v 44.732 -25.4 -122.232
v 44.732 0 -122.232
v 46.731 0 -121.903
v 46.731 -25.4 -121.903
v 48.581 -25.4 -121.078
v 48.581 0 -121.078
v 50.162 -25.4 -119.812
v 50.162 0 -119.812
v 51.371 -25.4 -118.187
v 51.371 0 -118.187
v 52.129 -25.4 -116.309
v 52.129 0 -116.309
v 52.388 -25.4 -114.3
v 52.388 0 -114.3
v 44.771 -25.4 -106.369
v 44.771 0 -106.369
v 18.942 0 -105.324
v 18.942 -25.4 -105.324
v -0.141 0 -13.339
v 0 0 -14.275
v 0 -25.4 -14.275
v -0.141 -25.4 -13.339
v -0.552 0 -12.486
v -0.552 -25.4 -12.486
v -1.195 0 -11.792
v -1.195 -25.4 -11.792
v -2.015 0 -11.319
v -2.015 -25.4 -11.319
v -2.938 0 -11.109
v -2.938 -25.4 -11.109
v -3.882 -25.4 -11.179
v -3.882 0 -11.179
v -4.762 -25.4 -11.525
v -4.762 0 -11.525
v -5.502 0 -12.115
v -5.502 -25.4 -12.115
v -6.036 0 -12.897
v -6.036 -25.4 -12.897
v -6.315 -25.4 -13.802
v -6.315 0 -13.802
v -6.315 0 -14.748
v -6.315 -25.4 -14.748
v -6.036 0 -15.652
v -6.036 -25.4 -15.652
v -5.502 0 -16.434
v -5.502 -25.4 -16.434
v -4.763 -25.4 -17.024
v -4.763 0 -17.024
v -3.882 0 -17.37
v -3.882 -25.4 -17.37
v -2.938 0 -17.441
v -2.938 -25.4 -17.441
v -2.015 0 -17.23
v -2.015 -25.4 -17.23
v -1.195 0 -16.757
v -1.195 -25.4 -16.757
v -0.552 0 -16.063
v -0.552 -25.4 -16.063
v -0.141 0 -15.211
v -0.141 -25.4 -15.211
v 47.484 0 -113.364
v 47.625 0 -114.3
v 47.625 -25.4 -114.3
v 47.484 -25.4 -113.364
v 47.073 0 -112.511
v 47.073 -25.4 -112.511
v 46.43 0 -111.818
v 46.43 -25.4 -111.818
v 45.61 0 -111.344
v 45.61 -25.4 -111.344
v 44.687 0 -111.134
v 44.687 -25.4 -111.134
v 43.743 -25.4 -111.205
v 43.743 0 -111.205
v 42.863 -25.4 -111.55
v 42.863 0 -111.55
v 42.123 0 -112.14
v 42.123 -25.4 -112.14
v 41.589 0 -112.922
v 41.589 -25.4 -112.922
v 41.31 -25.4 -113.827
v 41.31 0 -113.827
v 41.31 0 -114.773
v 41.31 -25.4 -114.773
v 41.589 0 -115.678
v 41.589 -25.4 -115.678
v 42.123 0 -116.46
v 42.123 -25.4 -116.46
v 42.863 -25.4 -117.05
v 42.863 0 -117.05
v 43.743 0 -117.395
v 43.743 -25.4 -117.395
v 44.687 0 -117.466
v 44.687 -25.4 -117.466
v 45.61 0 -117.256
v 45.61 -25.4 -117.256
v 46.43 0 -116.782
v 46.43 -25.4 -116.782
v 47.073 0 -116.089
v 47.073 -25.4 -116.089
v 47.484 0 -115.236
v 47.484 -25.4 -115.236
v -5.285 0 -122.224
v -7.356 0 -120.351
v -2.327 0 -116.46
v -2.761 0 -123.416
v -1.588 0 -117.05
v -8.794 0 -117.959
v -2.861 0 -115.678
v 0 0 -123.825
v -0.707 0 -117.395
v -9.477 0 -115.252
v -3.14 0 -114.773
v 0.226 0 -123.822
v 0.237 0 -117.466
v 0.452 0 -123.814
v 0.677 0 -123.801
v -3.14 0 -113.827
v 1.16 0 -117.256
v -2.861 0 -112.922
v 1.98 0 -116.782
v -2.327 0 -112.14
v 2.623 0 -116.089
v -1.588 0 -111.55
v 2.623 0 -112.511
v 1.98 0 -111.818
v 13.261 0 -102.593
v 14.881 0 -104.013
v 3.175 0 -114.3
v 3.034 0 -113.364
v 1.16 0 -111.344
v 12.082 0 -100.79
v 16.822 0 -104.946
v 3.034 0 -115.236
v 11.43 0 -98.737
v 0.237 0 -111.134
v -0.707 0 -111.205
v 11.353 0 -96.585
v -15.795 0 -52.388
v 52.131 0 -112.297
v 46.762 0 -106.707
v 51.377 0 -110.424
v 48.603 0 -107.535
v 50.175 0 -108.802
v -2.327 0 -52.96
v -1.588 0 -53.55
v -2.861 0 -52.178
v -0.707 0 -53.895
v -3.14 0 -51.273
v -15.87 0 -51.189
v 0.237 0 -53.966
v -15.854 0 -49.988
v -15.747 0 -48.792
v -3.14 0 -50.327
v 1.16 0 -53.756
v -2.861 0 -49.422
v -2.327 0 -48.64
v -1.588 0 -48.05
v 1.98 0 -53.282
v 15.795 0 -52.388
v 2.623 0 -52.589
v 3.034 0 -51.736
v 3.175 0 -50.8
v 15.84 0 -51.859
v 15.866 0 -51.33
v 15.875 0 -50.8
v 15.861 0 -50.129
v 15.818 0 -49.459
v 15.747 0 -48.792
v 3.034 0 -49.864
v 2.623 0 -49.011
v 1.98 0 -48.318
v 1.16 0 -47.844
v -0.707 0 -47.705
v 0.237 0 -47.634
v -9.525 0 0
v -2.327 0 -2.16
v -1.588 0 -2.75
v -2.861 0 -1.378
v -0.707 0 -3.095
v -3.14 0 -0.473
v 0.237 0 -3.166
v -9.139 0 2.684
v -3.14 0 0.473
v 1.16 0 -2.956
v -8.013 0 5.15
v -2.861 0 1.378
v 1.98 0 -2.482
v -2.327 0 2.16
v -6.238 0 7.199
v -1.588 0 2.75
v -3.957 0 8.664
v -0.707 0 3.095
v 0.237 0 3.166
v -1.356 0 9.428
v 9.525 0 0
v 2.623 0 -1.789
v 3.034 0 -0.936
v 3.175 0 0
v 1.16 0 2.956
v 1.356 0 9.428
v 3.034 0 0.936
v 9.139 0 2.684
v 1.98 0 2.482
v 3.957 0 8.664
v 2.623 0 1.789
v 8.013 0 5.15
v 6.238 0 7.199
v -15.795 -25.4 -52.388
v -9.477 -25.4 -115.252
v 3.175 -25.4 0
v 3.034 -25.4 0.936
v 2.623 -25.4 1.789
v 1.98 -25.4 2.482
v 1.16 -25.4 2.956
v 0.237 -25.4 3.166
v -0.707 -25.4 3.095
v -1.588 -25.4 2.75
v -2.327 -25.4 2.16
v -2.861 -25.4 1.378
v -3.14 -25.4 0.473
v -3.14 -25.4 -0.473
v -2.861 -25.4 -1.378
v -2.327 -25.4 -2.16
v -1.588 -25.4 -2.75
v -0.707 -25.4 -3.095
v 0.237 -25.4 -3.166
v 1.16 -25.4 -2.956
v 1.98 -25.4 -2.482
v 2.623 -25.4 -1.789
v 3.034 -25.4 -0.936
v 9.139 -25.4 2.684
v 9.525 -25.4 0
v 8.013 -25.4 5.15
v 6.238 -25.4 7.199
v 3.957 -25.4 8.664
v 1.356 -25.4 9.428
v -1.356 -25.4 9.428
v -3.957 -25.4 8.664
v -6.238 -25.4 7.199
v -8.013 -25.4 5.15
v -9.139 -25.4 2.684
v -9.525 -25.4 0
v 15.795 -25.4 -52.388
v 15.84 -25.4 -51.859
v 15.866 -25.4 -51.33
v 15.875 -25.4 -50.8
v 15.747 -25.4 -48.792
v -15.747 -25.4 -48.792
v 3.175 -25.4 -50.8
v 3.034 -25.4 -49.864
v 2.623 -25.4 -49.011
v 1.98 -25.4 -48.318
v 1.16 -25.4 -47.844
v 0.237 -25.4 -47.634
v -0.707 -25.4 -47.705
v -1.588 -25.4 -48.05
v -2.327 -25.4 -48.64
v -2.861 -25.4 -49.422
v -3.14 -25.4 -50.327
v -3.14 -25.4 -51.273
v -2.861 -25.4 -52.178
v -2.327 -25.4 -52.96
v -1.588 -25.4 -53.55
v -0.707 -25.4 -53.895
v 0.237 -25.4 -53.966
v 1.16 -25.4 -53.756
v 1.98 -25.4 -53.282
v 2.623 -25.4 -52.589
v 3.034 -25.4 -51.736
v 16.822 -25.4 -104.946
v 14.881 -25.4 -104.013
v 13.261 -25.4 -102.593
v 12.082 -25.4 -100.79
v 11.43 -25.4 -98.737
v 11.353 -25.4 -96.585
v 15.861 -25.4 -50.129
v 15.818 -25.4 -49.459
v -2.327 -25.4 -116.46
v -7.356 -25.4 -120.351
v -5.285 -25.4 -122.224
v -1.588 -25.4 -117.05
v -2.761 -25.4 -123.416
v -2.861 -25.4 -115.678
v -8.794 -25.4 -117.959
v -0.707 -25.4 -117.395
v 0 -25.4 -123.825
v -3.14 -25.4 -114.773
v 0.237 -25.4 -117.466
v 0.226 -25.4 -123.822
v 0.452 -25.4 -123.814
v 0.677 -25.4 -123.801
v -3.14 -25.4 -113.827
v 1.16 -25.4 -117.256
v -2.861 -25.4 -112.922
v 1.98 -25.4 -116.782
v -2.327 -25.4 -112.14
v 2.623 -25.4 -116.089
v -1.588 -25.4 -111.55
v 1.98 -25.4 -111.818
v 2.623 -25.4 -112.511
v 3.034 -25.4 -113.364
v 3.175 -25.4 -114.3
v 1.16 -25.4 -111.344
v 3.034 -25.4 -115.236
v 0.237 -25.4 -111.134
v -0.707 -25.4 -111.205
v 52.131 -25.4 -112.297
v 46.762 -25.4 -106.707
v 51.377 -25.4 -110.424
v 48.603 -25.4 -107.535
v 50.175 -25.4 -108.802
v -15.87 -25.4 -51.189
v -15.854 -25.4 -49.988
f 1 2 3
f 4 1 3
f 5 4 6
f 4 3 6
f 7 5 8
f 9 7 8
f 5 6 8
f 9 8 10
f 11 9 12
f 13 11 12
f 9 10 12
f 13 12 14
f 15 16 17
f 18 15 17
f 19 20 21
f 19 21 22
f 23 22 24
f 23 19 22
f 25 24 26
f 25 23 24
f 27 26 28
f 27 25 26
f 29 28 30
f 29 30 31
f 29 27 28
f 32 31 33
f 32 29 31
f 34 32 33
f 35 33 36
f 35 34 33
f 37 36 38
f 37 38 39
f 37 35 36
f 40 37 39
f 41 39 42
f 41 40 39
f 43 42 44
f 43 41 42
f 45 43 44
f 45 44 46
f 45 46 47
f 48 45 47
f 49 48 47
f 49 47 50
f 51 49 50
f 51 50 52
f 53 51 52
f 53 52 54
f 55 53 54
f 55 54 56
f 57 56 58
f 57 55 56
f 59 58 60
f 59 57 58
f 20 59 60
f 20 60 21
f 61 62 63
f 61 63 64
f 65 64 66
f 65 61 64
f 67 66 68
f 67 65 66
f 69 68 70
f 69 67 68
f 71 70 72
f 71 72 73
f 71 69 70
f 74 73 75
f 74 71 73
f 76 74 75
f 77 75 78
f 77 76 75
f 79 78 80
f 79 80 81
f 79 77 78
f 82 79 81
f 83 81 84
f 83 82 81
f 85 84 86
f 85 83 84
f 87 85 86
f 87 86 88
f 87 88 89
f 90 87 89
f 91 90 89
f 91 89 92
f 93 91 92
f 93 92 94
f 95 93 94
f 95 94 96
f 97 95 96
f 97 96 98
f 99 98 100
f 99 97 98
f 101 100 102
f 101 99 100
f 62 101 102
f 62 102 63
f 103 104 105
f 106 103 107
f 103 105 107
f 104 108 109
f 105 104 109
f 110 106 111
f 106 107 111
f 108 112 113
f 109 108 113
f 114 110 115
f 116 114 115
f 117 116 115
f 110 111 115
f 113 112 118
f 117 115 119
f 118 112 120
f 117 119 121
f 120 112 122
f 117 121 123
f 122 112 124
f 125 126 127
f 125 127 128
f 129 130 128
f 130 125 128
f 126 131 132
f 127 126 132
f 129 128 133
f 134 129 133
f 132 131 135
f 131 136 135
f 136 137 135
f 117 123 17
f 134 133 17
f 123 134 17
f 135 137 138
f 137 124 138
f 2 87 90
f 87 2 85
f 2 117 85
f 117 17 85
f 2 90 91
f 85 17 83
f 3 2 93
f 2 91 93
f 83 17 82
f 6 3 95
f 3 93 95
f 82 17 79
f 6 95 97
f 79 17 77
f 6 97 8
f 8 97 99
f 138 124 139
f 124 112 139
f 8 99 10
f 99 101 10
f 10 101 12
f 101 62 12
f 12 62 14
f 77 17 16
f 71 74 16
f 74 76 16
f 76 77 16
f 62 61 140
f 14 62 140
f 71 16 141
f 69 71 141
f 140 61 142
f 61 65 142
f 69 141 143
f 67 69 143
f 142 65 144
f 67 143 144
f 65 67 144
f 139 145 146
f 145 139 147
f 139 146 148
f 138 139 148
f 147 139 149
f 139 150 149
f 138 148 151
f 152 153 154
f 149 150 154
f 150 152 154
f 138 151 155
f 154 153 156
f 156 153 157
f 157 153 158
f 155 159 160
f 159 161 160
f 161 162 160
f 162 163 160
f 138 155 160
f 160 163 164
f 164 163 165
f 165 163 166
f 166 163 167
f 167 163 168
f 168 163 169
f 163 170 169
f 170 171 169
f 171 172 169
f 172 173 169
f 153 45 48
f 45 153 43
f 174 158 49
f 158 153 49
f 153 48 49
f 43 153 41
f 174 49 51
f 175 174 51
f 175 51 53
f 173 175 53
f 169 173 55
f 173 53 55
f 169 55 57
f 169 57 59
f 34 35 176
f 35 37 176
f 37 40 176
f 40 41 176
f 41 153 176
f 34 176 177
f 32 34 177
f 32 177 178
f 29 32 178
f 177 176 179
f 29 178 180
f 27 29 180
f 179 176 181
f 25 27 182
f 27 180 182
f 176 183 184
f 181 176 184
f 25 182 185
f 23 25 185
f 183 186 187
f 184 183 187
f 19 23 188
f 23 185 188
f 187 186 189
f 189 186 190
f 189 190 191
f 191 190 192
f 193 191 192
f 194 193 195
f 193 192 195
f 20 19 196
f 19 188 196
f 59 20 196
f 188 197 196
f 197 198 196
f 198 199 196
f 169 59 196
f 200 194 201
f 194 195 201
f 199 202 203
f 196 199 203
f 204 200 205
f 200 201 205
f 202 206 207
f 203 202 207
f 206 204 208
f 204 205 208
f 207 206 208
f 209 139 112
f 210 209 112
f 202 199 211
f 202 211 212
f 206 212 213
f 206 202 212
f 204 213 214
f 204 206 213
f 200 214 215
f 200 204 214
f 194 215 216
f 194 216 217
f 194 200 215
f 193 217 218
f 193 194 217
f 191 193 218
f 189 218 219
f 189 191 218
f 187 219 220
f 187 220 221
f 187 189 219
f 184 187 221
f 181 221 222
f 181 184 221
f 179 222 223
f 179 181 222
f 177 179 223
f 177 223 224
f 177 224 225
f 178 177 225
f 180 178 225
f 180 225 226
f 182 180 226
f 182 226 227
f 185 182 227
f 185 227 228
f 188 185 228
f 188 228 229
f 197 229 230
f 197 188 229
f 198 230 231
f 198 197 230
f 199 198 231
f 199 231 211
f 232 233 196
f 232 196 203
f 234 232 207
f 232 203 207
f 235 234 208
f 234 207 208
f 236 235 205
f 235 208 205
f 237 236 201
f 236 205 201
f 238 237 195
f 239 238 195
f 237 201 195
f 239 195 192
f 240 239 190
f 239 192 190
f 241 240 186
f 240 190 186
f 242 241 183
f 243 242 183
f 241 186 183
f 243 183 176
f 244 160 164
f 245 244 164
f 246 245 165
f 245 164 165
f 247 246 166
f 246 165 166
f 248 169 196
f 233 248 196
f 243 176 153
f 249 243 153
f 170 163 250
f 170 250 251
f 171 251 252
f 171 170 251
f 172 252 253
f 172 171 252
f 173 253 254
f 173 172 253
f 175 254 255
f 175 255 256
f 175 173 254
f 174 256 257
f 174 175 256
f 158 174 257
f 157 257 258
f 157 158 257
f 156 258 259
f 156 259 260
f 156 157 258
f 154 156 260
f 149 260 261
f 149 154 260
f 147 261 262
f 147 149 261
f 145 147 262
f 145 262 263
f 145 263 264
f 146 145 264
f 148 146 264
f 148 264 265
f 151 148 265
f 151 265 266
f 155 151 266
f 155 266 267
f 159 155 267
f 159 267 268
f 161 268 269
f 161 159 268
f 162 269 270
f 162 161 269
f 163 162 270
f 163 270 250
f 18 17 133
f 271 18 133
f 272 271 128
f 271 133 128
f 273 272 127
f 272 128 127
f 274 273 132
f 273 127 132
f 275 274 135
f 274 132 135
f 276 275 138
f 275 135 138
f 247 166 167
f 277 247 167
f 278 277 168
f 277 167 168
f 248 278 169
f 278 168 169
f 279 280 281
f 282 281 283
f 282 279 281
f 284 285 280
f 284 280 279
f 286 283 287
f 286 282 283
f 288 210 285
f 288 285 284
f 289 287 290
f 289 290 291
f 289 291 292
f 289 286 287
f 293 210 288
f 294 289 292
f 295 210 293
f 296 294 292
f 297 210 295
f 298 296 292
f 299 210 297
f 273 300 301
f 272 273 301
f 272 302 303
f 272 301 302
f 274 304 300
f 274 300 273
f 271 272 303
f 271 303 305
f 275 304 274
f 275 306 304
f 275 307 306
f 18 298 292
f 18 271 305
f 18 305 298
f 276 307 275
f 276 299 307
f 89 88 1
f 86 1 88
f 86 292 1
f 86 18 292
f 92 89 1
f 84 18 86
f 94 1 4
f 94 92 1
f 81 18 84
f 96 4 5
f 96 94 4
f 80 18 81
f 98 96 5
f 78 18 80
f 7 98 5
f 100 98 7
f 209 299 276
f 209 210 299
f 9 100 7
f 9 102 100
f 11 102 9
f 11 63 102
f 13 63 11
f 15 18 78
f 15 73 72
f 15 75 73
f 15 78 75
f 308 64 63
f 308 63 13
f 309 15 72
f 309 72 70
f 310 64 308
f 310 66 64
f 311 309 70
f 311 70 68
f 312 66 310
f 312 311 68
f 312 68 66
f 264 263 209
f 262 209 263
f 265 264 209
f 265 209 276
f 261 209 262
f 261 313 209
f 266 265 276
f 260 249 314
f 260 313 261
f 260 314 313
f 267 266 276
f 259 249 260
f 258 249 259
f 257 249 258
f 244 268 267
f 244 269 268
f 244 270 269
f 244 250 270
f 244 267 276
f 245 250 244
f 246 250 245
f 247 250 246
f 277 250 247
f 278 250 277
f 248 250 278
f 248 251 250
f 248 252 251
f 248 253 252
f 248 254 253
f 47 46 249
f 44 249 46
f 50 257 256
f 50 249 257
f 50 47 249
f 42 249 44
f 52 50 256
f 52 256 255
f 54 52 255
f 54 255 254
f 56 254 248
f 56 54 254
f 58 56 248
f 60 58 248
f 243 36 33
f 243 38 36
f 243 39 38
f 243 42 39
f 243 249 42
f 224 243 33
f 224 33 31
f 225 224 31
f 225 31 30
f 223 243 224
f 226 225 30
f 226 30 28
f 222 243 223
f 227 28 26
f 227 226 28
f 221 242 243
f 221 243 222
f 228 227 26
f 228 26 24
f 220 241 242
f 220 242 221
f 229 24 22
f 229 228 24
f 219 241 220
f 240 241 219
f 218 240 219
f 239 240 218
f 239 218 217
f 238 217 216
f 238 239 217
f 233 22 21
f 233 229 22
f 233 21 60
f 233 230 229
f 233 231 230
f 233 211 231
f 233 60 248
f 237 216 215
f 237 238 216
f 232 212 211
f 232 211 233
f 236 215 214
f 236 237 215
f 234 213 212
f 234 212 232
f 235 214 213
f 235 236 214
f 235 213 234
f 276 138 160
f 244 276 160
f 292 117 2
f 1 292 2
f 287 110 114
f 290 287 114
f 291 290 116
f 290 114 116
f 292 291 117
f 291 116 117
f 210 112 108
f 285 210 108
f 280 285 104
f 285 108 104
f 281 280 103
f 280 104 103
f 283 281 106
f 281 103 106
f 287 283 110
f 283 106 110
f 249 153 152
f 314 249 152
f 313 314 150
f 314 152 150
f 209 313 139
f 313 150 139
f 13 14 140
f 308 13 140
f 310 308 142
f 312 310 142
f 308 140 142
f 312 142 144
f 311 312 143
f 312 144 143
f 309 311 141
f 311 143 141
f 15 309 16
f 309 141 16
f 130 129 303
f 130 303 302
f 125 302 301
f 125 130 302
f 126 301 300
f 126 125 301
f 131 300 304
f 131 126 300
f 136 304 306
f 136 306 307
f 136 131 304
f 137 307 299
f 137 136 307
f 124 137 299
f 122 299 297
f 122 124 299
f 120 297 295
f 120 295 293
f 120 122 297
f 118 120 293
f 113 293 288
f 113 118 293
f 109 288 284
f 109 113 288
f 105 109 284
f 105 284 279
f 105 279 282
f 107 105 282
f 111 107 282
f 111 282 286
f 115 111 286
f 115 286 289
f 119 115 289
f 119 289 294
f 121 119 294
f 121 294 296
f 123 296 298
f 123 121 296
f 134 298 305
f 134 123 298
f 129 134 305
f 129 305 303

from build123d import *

# Parameters (mm, degrees)
F0_R     = 3.175
F1_DEPTH = 25.4


with BuildPart() as f1:
    # F0 (on Front) → F1 (new body)
    with BuildSketch(Plane.XZ):
        with BuildLine():
            ThreePointArc((-9.525, 0), (0, -9.525), (9.525, 0))
            ThreePointArc((9.525, 0), (0, 9.525), (-9.525, 0))
        make_face()
        Circle(F0_R, mode=Mode.SUBTRACT)
        with BuildLine():
            Line((15.747457, -48.791711), (9.525, 0))
            ThreePointArc((9.525, 0), (0, -9.525), (-9.525, 0))
            Line((-9.525, 0), (-15.747457, -48.791711))
            ThreePointArc((-15.747457, -48.791711), (0, -34.925), (15.747457, -48.791711))
        make_face()
        with Locations((-3.175, -14.2748)):
            Circle(F0_R, mode=Mode.SUBTRACT)
        with BuildLine():
            ThreePointArc((15.875, -50.8), (15.843082, -49.793832), (15.747457, -48.791711))
            ThreePointArc((15.747457, -48.791711), (0, -34.925), (-15.747457, -48.791711))
            ThreePointArc((-15.747457, -48.791711), (-15.873588, -50.588243), (-15.795426, -52.3875))
            ThreePointArc((-15.795426, -52.3875), (0, -66.675), (15.795426, -52.3875))
            ThreePointArc((15.795426, -52.3875), (15.855094, -51.594747), (15.875, -50.8))
        make_face()
        with Locations((0, -50.8)):
            Circle(F0_R, mode=Mode.SUBTRACT)
        with BuildLine():
            ThreePointArc((15.795426, -52.3875), (0, -66.675), (-15.795426, -52.3875))
            Line((-15.795426, -52.3875), (-9.477255, -115.2525))
            ThreePointArc((-9.477255, -115.2525), (-0.476848, -104.786944), (9.525, -114.3))
            ThreePointArc((9.525, -114.3), (6.970557, -120.791299), (0.677344, -123.800886))
            Line((0.677344, -123.800886), (44.732405, -122.232475))
            ThreePointArc((44.732405, -122.232475), (36.512523, -114.280693), (44.770992, -106.368993))
            Line((44.770992, -106.368993), (18.942263, -105.323627))
            ThreePointArc((18.942263, -105.323627), (13.261089, -102.592755), (11.353419, -96.584911))
            Line((11.353419, -96.584911), (15.795426, -52.3875))
        make_face()
        with BuildLine():
            ThreePointArc((9.525, -114.3), (-0.476848, -104.786944), (-9.477255, -115.2525))
            ThreePointArc((-9.477255, -115.2525), (-6.389564, -121.363929), (0, -123.825))
            Line((0, -123.825), (0.677344, -123.800886))
            ThreePointArc((0.677344, -123.800886), (6.970557, -120.791299), (9.525, -114.3))
        make_face()
        with Locations((0, -114.3)):
            Circle(F0_R, mode=Mode.SUBTRACT)
        with BuildLine():
            Line((0.677344, -123.800886), (0, -123.825))
            ThreePointArc((0, -123.825), (0.338886, -123.81897), (0.677344, -123.800886))
        make_face()
        with BuildLine():
            ThreePointArc((52.3875, -114.3), (50.175023, -108.801999), (44.770992, -106.368993))
            ThreePointArc((44.770992, -106.368993), (36.512523, -114.280693), (44.732405, -122.232475))
            ThreePointArc((44.732405, -122.232475), (50.161633, -119.81191), (52.3875, -114.3))
        make_face()
        with Locations((44.45, -114.3)):
            Circle(F0_R, mode=Mode.SUBTRACT)
    extrude(amount=F1_DEPTH)


solid = f1.part
